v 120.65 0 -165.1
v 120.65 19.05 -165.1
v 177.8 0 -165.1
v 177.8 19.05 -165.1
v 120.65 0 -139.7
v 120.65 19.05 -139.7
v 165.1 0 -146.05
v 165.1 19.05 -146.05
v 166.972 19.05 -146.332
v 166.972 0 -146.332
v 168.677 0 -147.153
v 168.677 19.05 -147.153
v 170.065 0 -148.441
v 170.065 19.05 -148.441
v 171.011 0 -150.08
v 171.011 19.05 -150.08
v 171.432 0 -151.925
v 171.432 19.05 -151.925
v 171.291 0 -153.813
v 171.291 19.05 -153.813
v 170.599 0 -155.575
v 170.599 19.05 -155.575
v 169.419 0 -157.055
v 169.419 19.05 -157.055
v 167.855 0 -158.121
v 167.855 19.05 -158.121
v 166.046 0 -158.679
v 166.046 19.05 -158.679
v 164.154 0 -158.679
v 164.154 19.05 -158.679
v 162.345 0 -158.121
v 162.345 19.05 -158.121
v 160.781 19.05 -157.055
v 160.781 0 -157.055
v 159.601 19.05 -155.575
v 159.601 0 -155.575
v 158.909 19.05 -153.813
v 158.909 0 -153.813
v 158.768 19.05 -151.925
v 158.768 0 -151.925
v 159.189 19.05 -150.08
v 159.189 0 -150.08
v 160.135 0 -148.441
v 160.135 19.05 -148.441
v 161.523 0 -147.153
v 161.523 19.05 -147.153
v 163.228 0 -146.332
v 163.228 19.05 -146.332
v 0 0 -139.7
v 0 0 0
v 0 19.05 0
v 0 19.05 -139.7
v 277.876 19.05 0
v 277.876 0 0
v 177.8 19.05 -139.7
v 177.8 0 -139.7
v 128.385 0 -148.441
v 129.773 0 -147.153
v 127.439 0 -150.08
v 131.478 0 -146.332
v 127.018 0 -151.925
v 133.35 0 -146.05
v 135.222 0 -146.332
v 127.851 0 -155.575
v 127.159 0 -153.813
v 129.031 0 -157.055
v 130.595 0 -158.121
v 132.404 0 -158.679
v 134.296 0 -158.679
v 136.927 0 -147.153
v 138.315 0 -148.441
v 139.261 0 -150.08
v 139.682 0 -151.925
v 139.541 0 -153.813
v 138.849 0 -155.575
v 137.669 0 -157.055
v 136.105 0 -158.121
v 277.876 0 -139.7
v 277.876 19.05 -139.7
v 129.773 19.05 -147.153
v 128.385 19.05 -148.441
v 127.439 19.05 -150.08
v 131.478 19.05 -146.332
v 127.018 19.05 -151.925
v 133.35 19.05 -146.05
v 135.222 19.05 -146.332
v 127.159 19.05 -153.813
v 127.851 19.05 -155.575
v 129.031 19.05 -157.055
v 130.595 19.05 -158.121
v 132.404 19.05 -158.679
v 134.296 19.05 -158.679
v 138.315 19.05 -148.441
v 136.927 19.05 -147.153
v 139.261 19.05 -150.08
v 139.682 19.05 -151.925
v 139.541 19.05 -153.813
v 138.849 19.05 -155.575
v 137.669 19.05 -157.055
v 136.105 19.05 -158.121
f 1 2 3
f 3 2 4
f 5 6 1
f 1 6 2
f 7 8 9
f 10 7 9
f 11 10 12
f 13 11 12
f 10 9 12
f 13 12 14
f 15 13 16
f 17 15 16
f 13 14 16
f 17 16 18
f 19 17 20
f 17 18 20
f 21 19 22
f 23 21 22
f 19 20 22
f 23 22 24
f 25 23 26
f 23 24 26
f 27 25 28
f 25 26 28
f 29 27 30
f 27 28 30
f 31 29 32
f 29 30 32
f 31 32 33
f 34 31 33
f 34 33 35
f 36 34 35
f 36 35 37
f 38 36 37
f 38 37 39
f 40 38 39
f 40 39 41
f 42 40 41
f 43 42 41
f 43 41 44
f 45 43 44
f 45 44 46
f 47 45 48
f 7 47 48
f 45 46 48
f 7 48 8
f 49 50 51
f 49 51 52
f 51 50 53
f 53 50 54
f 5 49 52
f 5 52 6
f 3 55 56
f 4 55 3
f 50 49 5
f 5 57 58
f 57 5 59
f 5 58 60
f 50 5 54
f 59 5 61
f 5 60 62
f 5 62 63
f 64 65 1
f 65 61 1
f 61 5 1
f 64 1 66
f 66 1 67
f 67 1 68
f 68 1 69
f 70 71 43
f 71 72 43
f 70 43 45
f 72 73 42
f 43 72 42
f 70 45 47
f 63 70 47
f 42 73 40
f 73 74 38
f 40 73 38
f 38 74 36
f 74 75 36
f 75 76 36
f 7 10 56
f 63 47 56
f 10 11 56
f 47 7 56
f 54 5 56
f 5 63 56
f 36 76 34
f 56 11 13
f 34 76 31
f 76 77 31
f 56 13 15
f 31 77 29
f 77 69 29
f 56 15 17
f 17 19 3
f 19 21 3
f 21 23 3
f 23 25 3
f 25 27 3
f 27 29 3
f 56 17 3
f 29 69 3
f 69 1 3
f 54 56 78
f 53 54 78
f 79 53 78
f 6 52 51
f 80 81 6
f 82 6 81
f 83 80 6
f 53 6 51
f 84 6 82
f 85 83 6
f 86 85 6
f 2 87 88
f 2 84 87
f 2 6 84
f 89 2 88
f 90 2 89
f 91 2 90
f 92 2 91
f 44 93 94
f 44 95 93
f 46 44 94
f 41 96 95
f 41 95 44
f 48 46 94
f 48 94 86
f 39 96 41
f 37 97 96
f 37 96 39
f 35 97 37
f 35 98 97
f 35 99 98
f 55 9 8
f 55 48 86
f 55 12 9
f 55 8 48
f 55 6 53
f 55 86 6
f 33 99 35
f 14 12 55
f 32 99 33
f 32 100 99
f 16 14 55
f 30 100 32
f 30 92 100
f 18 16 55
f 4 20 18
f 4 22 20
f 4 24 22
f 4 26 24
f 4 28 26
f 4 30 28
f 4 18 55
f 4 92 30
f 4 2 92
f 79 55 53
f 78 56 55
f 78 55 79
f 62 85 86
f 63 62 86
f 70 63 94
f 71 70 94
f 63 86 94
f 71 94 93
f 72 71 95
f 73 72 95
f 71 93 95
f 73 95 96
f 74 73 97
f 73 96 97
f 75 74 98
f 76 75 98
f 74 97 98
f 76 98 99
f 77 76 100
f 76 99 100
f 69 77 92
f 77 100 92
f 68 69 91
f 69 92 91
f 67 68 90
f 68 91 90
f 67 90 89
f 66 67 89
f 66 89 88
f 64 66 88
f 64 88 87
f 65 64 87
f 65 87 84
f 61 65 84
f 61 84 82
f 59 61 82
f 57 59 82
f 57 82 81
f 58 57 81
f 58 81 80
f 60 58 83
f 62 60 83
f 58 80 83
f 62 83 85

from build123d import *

# Parameters (mm, degrees)
SKETCH1_W           = 277.876
SKETCH1_H           = 139.7
BOSS_EXTRUDE2_DEPTH = 19.05
SKETCH2_W           = 57.15
SKETCH2_H           = 25.4
SKETCH2_R           = 6.35
BOSS_EXTRUDE3_DEPTH = 19.05


with BuildPart() as part:
    # Sketch1 → Boss-Extrude2 (new body)
    with BuildSketch(Plane(origin=(0, 0, 0), x_dir=(1, 0, 0), z_dir=(0, 1, 0))):
        with Locations((138.938, 69.85)):
            Rectangle(SKETCH1_W, SKETCH1_H)
    extrude(amount=BOSS_EXTRUDE2_DEPTH)

    # Sketch2 → Boss-Extrude3 (add)
    with BuildSketch(Plane(origin=(0, 19.05, 0), x_dir=(1, 0, 0), z_dir=(0, 1, 0))):
        with Locations((149.225, 152.4)):
            Rectangle(SKETCH2_W, SKETCH2_H)
        with Locations(Location((133.35, 152.4, 0), (0, 0, 270))):
            Circle(SKETCH2_R, mode=Mode.SUBTRACT)
        with Locations(Location((165.1, 152.4, 0), (0, 0, 270))):
            Circle(SKETCH2_R, mode=Mode.SUBTRACT)
    extrude(amount=-BOSS_EXTRUDE3_DEPTH)


solid = part.part
